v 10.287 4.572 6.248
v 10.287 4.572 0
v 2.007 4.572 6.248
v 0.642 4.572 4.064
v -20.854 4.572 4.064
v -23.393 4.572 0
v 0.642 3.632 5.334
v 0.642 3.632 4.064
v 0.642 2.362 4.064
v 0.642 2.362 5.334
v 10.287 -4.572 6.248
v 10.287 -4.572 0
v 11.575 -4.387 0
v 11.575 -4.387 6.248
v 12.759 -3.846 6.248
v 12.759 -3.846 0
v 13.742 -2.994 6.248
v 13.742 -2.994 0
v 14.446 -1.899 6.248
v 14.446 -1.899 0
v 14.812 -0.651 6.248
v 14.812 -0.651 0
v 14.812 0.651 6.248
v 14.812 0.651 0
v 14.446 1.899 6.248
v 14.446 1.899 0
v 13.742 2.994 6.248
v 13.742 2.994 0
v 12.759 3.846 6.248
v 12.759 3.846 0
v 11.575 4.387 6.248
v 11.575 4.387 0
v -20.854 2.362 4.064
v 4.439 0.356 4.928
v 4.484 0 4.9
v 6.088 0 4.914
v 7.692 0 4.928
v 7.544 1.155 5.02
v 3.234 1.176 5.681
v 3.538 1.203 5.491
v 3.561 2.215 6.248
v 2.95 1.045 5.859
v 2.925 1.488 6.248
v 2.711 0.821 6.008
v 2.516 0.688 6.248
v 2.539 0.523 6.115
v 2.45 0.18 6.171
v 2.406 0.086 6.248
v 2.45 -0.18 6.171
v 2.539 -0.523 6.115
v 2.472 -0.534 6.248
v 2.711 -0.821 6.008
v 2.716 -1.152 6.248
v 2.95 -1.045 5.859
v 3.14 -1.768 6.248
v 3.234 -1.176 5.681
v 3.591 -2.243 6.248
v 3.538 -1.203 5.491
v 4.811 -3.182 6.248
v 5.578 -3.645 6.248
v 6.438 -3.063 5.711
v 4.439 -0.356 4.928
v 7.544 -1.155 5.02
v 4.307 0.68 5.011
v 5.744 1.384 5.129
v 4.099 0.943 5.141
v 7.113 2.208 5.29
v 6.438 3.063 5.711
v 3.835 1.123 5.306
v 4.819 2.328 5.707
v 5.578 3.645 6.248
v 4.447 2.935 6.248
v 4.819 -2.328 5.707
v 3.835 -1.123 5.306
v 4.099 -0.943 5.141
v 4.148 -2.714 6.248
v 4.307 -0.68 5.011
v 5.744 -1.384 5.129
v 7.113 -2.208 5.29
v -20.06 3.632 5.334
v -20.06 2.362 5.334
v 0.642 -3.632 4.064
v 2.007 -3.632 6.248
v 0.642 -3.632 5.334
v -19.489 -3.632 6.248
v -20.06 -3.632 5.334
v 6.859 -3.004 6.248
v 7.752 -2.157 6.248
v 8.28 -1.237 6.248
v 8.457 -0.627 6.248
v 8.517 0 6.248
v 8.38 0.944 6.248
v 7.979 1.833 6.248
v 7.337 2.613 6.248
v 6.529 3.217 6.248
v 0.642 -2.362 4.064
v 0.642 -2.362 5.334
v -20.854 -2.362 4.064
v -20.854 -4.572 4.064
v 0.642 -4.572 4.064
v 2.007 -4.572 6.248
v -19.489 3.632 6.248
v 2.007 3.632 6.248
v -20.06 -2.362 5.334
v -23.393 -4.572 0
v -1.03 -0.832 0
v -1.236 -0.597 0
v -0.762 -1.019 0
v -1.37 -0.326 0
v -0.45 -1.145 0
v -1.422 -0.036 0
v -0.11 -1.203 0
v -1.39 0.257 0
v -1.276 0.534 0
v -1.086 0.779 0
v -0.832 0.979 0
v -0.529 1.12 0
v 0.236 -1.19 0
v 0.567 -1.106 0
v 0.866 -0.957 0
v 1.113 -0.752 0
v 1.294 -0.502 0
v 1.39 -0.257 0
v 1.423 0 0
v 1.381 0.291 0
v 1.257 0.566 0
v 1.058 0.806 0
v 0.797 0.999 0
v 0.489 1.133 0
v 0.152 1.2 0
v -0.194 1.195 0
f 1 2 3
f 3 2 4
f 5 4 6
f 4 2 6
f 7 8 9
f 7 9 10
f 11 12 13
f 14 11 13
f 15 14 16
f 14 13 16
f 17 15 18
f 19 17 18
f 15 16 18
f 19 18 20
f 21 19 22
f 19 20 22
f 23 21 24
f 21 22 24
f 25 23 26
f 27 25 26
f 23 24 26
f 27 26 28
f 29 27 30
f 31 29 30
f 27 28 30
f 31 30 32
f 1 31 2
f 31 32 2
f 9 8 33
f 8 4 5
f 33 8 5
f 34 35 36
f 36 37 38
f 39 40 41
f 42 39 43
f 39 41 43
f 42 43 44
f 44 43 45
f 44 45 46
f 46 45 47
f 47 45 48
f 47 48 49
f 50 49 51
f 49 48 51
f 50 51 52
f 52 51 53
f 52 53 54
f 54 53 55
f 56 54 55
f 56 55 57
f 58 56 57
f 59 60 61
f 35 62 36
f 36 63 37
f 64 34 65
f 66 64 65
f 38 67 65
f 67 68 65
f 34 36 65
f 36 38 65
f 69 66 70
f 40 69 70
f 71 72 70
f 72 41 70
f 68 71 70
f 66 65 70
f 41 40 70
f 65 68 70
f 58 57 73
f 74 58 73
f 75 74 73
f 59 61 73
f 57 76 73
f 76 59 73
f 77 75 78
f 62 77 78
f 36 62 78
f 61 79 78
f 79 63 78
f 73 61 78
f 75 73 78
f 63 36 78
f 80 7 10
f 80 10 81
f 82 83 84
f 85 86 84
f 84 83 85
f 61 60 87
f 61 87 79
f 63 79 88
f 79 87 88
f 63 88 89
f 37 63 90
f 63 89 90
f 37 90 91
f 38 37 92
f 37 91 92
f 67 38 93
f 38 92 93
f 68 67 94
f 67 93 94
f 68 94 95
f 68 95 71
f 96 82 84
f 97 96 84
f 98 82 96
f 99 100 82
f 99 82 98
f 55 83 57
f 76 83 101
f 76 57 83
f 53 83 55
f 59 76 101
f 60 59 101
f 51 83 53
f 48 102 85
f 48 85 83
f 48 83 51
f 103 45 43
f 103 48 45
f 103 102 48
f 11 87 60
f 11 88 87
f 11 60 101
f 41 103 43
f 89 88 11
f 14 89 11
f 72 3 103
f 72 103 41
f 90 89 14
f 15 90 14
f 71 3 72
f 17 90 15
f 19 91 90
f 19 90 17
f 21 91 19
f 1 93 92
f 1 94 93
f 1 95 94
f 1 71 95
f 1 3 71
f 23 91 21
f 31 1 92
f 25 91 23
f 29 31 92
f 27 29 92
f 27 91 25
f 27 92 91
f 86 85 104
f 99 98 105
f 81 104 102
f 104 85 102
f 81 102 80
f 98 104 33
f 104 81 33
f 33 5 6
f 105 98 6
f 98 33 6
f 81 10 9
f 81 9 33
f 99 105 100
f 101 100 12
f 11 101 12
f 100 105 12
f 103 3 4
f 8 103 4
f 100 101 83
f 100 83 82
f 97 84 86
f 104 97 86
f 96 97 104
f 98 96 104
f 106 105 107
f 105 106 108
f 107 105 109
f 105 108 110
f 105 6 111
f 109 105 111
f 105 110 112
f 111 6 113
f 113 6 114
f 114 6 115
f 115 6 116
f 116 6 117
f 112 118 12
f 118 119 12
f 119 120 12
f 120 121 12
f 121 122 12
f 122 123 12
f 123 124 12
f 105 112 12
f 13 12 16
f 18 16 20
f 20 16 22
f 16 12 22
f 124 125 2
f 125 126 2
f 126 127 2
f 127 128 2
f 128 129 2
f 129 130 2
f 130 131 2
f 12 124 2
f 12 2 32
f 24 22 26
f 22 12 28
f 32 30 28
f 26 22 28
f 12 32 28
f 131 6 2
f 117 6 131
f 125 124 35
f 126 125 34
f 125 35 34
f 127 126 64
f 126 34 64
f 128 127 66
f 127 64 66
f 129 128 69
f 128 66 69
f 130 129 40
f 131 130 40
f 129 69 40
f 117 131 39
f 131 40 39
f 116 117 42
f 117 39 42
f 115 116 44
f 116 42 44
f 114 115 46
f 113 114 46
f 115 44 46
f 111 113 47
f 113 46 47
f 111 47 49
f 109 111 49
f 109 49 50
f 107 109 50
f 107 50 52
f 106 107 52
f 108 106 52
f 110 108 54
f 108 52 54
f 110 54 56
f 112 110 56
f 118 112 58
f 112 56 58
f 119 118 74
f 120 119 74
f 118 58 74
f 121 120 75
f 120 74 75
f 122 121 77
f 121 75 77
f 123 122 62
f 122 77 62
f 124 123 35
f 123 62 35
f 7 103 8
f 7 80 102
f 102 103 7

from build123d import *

# Parameters (mm, degrees)
F1_DEPTH = 6.2484
F3_DEPTH = 0.9398
F4_W     = 24.0350353877
F4_H     = 1.27
F5_DEPTH = 1.27
F7_DEPTH = 9.145


with BuildPart() as f1:
    # F0 (on Top) → F1 (new body)
    with BuildSketch(Plane.XY):
        with BuildLine():
            Line((10.287, 4.572), (-23.3934, 4.572))
            Line((-23.3934, 4.572), (-23.3934, -4.572))
            Line((-23.3934, -4.572), (10.287, -4.572))
            ThreePointArc((10.287, -4.572), (14.859, 0), (10.287, 4.572))
        make_face()
    extrude(amount=F1_DEPTH)

    # F2 (on face) → F3 (cut)
    with BuildSketch(Plane(origin=(0, 4.572, 0), x_dir=(-1, 0, 0), z_dir=(0, 1, 0))):
        Polygon((23.3934, 6.2484), (-2.0066, 6.2484), (-0.6416353877, 4.064), (23.3934, 4.064), align=None)
    extrude(amount=-F3_DEPTH, mode=Mode.SUBTRACT)

    # F4 (on face) → F5 (cut)
    with BuildSketch(Plane(origin=(0, 3.6322, 0), x_dir=(-1, 0, 0), z_dir=(0, 1, 0))):
        with Locations((11.3758823062, 4.699)):
            Rectangle(F4_W, F4_H)
    extrude(amount=-F5_DEPTH, mode=Mode.SUBTRACT)

    # F6 (on face) → F7 (cut, through all)
    with BuildSketch(Plane(origin=(0, 4.572, 0), x_dir=(-1, 0, 0), z_dir=(0, 1, 0))):
        Polygon((19.4889663415, 6.2484), (23.3934, 0), (23.3934, 6.2484), align=None)
    extrude(amount=-F7_DEPTH, mode=Mode.SUBTRACT)

    # F8: F1 across plane


with BuildPart() as f1_1:
    add(f1.part)
    add(f1.part.mirror(Plane.XZ), mode=Mode.INTERSECT)

    # F9 (on Front) → F10 (revolve, cut)
    with BuildSketch(Plane.XZ):
        Polygon((3.4612531172, 5.5391628772), (0, 0), (-1.3459949312, -2.1540421642), (-0.3228249031, -2.7933897565), (4.4844231452, 4.8998152849), align=None)
        Polygon((5.7204784574, 9.154679198), (3.4612531172, 5.5391628772), (4.4844231452, 4.8998152849), (7.6917084592, 4.9278048398), (9.0377033903, 7.081847004), align=None)
    revolve(axis=Axis((2.8602392287, 0, 4.577339599), (0.5299192642, 0, 0.8480480962)), mode=Mode.SUBTRACT)


solid = f1_1.part
